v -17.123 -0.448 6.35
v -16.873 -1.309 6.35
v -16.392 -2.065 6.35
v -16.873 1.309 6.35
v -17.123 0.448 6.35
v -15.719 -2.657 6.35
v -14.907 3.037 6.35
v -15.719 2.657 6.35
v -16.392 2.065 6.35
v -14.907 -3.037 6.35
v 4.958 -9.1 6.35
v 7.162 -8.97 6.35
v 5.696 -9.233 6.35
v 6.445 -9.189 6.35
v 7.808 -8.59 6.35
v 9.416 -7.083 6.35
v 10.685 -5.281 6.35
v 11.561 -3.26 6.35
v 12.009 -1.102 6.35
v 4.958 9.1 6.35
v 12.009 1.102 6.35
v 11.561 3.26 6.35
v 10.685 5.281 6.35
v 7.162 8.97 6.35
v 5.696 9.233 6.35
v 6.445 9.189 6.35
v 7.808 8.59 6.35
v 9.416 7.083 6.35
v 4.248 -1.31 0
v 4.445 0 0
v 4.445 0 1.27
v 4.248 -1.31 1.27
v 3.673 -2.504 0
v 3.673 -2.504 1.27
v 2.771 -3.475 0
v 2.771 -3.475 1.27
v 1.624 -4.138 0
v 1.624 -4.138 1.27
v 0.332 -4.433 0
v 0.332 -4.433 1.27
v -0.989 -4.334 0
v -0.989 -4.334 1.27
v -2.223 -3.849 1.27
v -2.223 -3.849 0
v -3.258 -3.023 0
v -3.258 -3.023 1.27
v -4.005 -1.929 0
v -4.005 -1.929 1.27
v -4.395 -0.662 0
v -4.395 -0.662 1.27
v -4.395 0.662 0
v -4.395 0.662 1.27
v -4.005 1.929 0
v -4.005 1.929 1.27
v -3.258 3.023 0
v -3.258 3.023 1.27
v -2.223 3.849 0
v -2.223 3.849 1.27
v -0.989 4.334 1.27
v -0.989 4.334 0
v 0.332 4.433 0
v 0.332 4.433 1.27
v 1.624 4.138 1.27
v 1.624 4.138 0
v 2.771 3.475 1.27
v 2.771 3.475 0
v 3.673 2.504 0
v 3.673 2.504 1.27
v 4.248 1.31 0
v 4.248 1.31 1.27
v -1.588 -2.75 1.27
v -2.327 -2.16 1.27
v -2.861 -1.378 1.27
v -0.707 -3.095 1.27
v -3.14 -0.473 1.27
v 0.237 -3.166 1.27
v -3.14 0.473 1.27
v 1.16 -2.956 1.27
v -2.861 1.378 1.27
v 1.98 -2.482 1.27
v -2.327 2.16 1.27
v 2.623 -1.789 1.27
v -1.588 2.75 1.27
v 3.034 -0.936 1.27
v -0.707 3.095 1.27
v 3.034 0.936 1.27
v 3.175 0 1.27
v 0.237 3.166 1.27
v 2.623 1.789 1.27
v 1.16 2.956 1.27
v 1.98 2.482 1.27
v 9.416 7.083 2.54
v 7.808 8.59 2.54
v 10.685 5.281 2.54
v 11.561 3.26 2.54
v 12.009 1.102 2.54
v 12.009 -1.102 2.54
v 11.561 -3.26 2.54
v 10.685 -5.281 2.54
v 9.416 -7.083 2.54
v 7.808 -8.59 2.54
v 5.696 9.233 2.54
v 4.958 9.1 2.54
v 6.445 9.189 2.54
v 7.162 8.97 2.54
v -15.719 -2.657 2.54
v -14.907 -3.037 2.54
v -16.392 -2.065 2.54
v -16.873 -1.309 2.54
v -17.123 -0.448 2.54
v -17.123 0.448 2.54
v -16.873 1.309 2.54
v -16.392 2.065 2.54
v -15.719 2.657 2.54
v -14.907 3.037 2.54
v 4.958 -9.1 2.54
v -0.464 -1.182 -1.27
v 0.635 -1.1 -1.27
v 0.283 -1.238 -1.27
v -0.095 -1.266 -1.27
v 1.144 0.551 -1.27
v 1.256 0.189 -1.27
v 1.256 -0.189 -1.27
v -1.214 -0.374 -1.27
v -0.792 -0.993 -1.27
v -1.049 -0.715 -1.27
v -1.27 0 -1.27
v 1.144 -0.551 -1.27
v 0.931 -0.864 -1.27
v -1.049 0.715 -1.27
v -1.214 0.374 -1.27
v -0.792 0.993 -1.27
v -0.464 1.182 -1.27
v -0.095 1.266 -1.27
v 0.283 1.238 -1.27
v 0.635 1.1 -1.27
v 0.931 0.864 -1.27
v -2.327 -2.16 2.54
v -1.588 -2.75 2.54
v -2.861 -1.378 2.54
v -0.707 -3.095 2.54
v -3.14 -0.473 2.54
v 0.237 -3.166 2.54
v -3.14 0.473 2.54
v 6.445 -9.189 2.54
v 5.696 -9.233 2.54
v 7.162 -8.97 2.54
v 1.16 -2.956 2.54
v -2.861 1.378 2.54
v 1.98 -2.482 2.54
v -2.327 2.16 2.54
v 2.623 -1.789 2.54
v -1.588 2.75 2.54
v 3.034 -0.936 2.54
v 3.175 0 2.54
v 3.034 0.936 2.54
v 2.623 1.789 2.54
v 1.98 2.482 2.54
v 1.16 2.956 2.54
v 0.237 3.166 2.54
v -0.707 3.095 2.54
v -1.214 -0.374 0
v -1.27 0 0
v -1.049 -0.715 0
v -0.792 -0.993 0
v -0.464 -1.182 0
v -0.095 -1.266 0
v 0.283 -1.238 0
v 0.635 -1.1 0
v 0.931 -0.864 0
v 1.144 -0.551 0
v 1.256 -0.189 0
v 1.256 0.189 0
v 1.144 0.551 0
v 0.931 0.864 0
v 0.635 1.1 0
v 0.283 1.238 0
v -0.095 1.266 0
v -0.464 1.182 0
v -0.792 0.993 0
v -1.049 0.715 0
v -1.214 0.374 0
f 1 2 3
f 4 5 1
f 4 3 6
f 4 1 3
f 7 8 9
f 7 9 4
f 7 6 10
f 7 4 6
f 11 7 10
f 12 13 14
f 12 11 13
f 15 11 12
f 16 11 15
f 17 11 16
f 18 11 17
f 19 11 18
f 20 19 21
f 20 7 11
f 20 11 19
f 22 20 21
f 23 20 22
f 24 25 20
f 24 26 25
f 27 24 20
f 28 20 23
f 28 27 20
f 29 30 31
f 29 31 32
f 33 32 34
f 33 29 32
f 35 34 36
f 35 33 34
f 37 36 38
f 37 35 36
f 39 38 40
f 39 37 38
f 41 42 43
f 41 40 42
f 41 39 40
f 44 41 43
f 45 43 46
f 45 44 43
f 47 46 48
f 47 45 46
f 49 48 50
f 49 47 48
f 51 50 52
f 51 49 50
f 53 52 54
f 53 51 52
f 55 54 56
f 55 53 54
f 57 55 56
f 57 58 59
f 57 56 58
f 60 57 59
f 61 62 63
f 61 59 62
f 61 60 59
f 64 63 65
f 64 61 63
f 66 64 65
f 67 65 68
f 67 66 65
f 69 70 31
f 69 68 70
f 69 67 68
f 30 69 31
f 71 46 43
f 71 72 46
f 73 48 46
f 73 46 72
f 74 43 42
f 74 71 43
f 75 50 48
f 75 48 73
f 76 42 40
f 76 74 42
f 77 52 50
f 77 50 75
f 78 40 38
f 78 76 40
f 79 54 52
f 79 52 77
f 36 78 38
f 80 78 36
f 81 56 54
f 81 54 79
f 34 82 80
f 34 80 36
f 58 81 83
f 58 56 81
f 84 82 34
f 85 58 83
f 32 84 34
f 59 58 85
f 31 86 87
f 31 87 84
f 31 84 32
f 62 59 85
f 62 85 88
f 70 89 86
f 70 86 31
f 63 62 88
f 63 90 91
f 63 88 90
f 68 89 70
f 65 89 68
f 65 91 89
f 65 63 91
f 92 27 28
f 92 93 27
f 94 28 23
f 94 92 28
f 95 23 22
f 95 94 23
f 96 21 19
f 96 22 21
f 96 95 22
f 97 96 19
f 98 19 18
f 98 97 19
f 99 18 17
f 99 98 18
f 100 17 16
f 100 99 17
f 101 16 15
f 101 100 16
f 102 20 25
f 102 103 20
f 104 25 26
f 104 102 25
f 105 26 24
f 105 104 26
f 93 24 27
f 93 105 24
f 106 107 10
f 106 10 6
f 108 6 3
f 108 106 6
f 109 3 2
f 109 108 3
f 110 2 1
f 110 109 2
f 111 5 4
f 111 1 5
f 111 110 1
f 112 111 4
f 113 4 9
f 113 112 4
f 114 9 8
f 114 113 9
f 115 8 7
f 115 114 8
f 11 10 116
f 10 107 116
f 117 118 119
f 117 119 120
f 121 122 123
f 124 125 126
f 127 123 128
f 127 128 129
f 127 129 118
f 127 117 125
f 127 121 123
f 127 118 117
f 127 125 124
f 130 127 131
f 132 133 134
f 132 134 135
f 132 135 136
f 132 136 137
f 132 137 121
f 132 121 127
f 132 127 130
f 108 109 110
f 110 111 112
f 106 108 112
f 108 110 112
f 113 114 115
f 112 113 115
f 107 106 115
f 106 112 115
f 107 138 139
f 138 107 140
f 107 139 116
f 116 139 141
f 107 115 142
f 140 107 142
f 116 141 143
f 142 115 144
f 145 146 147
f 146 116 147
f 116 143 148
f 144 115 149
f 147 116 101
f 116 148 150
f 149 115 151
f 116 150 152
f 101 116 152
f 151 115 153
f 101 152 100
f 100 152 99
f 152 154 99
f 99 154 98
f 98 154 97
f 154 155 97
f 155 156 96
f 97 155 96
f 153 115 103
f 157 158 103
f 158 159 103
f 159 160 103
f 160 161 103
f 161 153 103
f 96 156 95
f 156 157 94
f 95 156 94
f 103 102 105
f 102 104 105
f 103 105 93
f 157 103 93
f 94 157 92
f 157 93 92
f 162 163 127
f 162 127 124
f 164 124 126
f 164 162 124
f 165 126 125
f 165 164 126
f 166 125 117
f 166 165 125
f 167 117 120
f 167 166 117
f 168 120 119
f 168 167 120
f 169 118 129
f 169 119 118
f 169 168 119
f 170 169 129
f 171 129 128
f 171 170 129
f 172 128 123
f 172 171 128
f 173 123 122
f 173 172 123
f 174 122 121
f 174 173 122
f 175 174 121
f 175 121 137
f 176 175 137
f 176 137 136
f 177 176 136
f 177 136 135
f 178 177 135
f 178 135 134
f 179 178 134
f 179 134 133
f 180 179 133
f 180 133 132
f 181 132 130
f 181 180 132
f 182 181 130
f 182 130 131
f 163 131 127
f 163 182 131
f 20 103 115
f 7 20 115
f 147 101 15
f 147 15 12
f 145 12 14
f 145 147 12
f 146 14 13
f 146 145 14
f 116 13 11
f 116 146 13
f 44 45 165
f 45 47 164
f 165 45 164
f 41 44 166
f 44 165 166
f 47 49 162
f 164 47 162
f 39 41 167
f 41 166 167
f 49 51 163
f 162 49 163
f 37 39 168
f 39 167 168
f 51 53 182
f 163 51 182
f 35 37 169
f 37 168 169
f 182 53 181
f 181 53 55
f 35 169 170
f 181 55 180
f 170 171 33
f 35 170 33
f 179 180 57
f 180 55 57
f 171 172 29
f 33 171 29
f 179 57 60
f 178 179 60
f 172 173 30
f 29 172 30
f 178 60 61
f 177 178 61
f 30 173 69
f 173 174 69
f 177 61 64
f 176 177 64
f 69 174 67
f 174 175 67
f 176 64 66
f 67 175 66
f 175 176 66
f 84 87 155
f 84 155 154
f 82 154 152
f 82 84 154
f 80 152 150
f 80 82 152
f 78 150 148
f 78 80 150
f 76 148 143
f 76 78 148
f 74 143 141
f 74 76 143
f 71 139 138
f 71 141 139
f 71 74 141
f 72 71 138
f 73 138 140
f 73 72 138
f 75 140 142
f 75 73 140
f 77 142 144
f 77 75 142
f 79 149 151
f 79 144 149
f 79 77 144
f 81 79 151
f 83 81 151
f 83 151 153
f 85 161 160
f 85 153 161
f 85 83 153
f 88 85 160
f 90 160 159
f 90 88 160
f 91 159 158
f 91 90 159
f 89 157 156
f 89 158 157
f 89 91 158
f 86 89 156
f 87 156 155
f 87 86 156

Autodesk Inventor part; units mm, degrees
ref_plane "YZ Plane" through (0, 0, 0) normal (1, 0, 0) x (0, 1, 0)
ref_plane "XZ Plane" through (0, 0, 0) normal (0, 1, 0) x (-1, 0, 0)
ref_plane "XY Plane" through (0, 0, 0) normal (0, 0, 1) x (1, 0, 0)
sketch "Sketch1" plane through (0, 0, 0) normal (0, 0, 1) x (1, 0, 0)
  circle A0 centre (0, 0) radius 4.445
  dimension "d0" = 8.89
extrude "Extrusion1" add sketch "Sketch1" along normal blind 1.27
sketch "Sketch2" plane through (0, 0, 0) normal (0, 0, -1) x (-1, 0, 0)
  circle A0 centre (0, 0) radius 4.445 projected
  circle A1 centre (0, 0) radius 1.27
  dimension "d3" = 2.54
extrude "Extrusion2" add sketch "Sketch2" along normal blind 1.27 contours A1
sketch "Sketch3" plane through (0, 0, 1.27) normal (0, 0, 1) x (1, 0, 0)
  circle A0 centre (0, 0) radius 4.445 projected
  circle A1 centre (0, 0) radius 3.175
  dimension "d6" = 6.35
extrude "Extrusion3" add sketch "Sketch3" along normal blind 1.27 contours A1
sketch "Sketch4" plane through (0, 0, 2.54) normal (0, 0, 1) x (1, 0, 0)
  circle A0 centre (0, 0) radius 3.175 projected
  line L0 (6.35, -9.525) -> (6.35, 9.525)
  line L1 (4.9582, 9.1002) -> (-14.9068, 3.0367)
  line L2 (-14.9068, -3.0367) -> (4.9582, -9.1002)
  arc A1 (7.808, -8.5899) -> (7.808, 8.5899) centre (1.27, 0) ccw
  arc A2 (-14.9068, 3.0367) -> (-14.9068, -3.0367) centre (-13.9799, 0) ccw
  arc A3 (7.808, 8.5899) -> (4.9582, 9.1002) centre (5.8851, 6.0635) ccw
  arc A4 (4.9582, -9.1002) -> (7.808, -8.5899) centre (5.8851, -6.0635) ccw
  point P0 (-24.8555, 0)
  dimension "d9" = 19.05
  dimension "d13" = 9.525
  dimension "d14" = 6.35
  dimension "d15" = 10.795
  dimension "d16" = 3.175
  dimension "d20" = 0
  dimension "d21" = 22.225
  dimension "d22" = 3.175
extrude "Extrusion4" add sketch "Sketch4" along normal blind 3.81 contours A0 | A4 L2 A2 L1 A3 L0 | L0 A3 A1 A4
properties part number "Knob 1764"
